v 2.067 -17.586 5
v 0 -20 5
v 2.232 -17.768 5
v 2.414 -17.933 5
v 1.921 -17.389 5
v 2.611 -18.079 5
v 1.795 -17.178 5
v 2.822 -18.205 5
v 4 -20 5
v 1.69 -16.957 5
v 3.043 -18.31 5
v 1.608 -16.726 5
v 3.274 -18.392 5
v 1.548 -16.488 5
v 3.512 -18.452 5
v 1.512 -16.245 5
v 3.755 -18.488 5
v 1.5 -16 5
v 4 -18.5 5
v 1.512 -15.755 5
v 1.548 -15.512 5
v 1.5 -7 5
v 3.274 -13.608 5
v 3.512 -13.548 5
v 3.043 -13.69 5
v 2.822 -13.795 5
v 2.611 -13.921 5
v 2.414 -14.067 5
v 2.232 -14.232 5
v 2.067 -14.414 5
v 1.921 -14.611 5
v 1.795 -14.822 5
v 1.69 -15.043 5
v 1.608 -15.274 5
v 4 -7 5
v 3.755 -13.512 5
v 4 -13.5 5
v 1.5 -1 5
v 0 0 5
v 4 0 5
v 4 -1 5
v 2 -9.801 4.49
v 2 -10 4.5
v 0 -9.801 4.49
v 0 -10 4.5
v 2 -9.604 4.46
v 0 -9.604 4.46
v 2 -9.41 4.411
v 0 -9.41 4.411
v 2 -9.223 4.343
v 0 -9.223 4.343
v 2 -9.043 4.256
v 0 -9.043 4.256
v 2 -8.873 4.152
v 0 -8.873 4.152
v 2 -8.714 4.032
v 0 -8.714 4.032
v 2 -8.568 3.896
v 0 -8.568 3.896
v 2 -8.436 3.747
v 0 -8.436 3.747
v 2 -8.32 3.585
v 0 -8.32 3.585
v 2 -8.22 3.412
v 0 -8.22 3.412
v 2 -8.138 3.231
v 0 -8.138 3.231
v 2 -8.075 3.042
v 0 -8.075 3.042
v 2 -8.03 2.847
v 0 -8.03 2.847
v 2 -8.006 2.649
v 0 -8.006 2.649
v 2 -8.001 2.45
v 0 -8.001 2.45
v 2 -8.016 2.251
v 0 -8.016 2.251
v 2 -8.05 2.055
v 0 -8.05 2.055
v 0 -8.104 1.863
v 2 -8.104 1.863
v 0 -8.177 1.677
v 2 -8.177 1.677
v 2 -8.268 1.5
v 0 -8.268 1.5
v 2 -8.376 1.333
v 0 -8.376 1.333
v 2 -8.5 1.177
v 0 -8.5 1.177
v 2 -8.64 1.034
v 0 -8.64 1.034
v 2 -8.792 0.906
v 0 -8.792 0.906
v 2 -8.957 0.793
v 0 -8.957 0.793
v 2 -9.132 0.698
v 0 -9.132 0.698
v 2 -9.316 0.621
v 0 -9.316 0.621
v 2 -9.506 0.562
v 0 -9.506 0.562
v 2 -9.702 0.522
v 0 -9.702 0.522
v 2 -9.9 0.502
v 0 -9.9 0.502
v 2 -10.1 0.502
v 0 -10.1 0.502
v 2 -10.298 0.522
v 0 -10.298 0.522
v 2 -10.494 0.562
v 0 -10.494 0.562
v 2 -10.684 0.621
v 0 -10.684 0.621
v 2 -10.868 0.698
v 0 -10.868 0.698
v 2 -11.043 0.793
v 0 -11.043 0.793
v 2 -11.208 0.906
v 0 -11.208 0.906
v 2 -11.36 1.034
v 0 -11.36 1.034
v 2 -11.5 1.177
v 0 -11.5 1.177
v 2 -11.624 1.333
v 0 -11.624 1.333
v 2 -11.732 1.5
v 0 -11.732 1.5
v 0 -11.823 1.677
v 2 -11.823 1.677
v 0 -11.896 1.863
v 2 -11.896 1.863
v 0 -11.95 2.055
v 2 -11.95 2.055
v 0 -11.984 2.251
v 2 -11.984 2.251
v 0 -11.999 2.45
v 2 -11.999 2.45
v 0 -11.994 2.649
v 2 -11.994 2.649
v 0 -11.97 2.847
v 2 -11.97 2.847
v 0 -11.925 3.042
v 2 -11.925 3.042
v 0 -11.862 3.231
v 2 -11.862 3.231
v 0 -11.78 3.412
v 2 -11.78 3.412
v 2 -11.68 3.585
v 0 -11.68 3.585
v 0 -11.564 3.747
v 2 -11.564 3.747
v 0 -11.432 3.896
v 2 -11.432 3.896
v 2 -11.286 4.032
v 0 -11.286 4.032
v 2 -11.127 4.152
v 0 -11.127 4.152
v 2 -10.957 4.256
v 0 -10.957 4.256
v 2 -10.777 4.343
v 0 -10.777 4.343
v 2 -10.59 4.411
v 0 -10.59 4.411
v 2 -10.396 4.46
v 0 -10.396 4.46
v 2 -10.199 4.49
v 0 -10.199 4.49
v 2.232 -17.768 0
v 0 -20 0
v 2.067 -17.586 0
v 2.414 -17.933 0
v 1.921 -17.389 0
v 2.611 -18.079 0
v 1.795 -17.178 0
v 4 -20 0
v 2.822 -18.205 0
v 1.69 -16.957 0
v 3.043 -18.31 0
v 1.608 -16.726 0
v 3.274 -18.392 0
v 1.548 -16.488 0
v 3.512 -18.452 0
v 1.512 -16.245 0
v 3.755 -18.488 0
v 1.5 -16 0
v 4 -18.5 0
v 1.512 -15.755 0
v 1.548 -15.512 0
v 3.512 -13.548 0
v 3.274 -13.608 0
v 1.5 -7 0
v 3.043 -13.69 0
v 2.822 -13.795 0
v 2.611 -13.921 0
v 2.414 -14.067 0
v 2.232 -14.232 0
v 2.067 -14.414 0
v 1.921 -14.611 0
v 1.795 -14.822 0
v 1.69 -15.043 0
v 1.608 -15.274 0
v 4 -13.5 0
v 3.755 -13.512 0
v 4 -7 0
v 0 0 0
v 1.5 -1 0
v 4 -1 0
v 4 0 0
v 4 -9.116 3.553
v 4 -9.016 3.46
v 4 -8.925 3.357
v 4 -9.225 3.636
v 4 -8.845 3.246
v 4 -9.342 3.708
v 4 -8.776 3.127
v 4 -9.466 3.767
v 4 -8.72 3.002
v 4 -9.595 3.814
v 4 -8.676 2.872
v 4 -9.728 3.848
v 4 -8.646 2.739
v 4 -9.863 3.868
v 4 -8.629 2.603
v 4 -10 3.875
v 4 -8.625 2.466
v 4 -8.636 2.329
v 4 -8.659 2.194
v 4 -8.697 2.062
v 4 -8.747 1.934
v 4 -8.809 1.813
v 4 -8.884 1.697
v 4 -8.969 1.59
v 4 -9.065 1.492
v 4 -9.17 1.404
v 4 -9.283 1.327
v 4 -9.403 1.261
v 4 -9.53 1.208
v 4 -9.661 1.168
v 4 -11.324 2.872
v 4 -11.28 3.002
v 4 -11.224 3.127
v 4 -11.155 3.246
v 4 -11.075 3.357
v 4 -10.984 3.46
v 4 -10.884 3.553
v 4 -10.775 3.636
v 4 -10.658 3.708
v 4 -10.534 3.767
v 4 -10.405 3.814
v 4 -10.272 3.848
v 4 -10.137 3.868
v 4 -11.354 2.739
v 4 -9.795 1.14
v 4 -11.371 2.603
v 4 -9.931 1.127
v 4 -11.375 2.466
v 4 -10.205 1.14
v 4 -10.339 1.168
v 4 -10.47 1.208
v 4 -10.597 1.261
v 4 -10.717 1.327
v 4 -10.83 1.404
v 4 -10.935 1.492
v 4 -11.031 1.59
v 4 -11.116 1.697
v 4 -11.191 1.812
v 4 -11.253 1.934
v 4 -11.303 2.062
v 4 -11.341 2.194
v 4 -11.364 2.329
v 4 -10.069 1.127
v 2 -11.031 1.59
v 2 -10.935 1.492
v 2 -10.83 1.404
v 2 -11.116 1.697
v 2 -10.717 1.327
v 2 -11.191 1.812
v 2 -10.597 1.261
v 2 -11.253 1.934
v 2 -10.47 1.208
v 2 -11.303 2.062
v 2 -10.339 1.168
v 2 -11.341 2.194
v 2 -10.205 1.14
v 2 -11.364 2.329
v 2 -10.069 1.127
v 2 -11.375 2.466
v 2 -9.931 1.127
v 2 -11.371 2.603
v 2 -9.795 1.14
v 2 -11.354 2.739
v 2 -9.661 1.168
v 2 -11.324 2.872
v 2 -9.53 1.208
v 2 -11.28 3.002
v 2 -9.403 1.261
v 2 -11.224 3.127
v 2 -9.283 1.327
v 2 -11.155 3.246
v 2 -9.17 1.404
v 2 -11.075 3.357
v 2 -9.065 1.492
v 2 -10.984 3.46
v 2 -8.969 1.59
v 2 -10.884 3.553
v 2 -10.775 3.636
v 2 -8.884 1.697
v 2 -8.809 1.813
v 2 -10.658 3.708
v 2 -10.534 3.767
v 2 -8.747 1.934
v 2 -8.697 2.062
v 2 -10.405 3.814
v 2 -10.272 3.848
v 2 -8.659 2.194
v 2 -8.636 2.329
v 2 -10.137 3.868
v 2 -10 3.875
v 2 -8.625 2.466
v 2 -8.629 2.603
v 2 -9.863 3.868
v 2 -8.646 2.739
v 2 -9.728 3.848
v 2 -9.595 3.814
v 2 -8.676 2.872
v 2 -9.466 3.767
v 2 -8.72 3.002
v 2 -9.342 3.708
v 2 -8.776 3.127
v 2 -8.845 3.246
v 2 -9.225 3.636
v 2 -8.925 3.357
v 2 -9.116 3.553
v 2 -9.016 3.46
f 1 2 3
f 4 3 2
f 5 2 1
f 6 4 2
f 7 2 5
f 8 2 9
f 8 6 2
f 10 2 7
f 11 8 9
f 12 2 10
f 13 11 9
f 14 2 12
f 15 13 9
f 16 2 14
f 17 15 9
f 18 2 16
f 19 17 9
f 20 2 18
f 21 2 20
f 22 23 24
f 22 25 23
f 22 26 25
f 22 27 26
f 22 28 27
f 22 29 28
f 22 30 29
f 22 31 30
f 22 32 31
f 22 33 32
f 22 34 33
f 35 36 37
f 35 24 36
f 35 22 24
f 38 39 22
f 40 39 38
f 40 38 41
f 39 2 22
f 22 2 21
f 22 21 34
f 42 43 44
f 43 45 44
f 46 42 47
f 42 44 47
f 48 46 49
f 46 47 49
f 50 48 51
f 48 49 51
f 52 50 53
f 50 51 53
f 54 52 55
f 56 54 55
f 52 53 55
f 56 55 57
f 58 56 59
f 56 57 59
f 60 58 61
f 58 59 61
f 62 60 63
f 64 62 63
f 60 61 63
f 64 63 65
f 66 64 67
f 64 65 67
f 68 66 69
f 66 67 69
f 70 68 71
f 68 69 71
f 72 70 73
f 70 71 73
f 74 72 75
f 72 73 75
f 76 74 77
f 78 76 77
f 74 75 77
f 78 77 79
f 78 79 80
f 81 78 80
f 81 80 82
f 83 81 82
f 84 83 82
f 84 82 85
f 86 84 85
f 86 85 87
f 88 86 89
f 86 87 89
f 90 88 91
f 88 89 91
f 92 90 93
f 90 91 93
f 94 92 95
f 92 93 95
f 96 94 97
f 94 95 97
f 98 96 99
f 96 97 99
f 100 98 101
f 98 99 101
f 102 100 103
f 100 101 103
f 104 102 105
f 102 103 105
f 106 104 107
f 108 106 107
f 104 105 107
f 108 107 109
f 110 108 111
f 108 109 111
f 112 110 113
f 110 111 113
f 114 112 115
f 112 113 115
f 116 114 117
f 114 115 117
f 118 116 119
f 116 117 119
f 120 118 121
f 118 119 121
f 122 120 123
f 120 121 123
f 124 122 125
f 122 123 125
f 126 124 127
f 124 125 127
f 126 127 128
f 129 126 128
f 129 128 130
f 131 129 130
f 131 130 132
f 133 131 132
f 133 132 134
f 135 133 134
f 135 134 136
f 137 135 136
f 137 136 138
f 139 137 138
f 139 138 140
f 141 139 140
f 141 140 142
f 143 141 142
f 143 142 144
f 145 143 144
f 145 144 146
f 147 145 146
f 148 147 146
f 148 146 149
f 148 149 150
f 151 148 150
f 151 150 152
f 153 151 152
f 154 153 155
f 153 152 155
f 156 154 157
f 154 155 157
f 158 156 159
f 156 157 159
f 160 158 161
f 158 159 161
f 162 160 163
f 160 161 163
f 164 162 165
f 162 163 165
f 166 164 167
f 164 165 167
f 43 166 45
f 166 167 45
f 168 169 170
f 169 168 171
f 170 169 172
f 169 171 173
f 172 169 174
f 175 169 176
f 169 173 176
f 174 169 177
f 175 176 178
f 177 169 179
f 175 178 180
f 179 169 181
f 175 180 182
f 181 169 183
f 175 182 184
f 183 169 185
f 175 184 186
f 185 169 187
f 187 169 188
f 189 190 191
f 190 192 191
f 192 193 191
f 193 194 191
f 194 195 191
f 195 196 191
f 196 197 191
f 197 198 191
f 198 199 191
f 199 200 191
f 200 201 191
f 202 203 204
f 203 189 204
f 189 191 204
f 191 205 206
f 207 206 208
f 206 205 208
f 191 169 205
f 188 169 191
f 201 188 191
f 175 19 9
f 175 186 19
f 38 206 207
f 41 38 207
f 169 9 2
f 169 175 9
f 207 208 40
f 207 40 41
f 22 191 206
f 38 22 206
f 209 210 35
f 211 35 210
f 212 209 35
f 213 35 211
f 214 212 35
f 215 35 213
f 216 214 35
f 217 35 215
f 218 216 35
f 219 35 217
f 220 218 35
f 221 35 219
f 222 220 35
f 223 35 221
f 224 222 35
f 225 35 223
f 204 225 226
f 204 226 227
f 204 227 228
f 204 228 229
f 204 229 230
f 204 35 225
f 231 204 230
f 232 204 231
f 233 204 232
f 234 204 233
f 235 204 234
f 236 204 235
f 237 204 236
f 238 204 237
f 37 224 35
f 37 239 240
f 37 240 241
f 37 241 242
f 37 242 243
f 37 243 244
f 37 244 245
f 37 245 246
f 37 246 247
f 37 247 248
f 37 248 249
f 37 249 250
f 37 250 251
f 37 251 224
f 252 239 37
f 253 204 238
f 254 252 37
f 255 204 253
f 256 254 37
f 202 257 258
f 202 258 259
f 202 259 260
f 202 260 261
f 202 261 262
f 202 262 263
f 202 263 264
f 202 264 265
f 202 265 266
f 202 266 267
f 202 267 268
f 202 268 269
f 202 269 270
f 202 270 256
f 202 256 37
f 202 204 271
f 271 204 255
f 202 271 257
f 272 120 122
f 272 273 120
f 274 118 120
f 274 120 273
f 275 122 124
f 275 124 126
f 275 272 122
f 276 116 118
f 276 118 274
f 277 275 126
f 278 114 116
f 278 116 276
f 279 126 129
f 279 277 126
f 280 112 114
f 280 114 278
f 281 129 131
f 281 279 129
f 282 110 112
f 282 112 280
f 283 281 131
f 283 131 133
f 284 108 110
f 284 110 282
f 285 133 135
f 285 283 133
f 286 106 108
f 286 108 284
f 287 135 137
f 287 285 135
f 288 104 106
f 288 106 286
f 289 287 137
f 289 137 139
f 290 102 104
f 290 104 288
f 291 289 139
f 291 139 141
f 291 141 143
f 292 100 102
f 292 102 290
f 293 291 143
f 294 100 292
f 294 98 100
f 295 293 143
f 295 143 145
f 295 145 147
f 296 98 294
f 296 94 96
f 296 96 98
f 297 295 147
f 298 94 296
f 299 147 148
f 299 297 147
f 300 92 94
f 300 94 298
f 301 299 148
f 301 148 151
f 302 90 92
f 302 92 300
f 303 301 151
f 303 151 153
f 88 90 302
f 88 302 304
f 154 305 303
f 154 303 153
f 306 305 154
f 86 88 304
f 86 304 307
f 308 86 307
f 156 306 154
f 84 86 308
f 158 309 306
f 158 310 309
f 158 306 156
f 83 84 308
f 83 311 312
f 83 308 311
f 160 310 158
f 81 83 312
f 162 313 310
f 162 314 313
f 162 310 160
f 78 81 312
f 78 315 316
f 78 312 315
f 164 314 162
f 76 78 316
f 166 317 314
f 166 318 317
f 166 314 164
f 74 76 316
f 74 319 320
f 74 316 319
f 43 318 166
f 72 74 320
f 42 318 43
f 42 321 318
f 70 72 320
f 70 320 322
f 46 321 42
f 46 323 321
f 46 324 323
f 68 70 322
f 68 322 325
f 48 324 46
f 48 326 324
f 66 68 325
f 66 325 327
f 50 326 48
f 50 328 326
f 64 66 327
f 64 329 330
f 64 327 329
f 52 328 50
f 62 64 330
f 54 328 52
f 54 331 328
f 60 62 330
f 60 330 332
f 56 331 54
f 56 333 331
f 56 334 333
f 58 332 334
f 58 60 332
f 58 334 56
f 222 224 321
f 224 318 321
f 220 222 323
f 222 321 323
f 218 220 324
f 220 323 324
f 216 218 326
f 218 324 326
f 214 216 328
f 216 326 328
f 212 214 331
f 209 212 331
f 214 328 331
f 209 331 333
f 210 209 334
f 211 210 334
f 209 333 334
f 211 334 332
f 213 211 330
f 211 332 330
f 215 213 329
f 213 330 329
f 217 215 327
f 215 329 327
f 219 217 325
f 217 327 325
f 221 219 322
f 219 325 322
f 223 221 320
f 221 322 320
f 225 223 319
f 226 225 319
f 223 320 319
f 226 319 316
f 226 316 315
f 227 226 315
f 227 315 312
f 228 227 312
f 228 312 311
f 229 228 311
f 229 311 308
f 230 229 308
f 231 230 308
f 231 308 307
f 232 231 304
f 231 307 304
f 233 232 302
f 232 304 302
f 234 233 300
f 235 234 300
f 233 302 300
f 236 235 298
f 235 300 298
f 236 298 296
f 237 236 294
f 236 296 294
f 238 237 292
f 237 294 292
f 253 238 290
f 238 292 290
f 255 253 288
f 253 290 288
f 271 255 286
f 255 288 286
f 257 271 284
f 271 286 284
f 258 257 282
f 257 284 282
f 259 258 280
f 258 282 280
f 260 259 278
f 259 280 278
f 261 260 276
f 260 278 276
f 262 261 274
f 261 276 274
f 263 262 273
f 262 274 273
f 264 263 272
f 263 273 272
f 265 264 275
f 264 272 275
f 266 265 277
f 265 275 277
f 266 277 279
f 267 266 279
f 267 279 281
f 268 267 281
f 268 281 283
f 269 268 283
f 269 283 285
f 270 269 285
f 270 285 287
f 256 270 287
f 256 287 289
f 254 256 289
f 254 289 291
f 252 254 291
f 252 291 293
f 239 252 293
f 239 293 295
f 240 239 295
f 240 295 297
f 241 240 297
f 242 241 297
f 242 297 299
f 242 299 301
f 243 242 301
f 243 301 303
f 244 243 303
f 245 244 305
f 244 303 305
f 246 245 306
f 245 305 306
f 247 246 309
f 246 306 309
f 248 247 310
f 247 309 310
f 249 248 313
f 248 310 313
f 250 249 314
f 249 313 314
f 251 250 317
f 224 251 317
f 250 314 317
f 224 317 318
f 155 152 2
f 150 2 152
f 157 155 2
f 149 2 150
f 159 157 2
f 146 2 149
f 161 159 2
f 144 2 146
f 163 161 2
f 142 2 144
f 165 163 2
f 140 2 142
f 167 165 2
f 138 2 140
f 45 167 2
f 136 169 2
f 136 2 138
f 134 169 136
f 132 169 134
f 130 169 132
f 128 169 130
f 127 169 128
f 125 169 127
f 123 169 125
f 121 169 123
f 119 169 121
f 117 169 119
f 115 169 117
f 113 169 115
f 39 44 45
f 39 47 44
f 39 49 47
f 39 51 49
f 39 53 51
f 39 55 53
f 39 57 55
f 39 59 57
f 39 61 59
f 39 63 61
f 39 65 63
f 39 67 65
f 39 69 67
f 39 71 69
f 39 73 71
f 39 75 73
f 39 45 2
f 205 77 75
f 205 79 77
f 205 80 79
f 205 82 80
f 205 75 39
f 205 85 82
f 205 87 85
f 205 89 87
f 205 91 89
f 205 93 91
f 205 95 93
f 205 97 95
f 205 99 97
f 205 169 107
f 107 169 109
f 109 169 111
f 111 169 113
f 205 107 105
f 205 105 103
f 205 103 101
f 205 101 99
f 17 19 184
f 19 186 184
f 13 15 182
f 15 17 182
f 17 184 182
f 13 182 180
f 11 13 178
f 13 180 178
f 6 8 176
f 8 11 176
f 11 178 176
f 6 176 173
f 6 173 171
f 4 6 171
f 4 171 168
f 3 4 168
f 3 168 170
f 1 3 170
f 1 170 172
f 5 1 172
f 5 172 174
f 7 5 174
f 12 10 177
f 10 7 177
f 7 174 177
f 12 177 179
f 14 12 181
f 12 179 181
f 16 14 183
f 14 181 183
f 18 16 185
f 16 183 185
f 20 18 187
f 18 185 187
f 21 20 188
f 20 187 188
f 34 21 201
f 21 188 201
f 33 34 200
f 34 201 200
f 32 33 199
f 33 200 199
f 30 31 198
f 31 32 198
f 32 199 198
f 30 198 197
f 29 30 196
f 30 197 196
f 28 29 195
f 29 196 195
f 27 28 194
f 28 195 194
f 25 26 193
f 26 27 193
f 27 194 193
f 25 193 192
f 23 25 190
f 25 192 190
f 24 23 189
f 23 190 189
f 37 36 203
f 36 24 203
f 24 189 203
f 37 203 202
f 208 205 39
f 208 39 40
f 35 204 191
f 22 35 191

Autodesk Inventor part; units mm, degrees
ref_plane "YZ Plane" through (0, 0, 0) normal (1, 0, 0) x (0, 1, 0)
ref_plane "XZ Plane" through (0, 0, 0) normal (0, 1, 0) x (-1, 0, 0)
ref_plane "XY Plane" through (0, 0, 0) normal (0, 0, 1) x (1, 0, 0)
sketch "Sketch1" plane through (0, 0, 0) normal (0, 0, 1) x (1, 0, 0)
  line L0 (0, 0) -> (4, 0)
  line L1 (4, 0) -> (4, -20)
  line L2 (4, -20) -> (0, -20)
  line L3 (0, -20) -> (0, 0)
  circle A0 centre (4, -4) radius 2.5
  circle A1 centre (4, -16) radius 2.5
  line L4 (1.5, -4) -> (1.5, -7)
  line L5 (1.5, -7) -> (1.5, -1)
  line L6 (4, -7) -> (1.5, -7)
  line L7 (1.5, -1) -> (4, -1)
  point P0 (4, -18.5)
  point P1 (4, -13.5)
  dimension "d2" = 5
  dimension "d0" = 20
  dimension "d1" = 4
  dimension "d3" = 5
  dimension "d4" = 4
  dimension "d5" = 4
  dimension "d6" = 3
  dimension "d7" = 3
extrude "Extrusion1" add sketch "Sketch1" along normal blind 5 contours L0 L1 L7 L5 L4 L6 A1 L2 L3
sketch "Sketch3" plane through (0, -20, 0) normal (-1, 0, 0) x (0, 0, 1)
  circle A0 centre (2.5, 10) radius 1.375
  line L0 (0, 0) -> (5, 0) projected
  line L1 (0, 20) -> (0, 0) projected
  dimension "d10" = 10
  dimension "d11" = 2.5
  dimension "d12" = 20
  dimension "d13" = 2.75
extrude "Extrusion2" cut sketch "Sketch3" against normal blind 20
sketch "Sketch4" plane through (0, -20, 0) normal (-1, 0, 0) x (0, 0, 1)
  circle A0 centre (2.5, 10) radius 1.375 projected
  circle A1 centre (2.5, 10) radius 2
  point P0 (0, 20)
  dimension "d16" = 4
extrude "Extrusion3" cut sketch "Sketch4" against normal blind 2 contours A0 | A1
equation "\"d1\" = d4"
equation "\"d5\" = d4"
properties part number "POMSliderAxis"
